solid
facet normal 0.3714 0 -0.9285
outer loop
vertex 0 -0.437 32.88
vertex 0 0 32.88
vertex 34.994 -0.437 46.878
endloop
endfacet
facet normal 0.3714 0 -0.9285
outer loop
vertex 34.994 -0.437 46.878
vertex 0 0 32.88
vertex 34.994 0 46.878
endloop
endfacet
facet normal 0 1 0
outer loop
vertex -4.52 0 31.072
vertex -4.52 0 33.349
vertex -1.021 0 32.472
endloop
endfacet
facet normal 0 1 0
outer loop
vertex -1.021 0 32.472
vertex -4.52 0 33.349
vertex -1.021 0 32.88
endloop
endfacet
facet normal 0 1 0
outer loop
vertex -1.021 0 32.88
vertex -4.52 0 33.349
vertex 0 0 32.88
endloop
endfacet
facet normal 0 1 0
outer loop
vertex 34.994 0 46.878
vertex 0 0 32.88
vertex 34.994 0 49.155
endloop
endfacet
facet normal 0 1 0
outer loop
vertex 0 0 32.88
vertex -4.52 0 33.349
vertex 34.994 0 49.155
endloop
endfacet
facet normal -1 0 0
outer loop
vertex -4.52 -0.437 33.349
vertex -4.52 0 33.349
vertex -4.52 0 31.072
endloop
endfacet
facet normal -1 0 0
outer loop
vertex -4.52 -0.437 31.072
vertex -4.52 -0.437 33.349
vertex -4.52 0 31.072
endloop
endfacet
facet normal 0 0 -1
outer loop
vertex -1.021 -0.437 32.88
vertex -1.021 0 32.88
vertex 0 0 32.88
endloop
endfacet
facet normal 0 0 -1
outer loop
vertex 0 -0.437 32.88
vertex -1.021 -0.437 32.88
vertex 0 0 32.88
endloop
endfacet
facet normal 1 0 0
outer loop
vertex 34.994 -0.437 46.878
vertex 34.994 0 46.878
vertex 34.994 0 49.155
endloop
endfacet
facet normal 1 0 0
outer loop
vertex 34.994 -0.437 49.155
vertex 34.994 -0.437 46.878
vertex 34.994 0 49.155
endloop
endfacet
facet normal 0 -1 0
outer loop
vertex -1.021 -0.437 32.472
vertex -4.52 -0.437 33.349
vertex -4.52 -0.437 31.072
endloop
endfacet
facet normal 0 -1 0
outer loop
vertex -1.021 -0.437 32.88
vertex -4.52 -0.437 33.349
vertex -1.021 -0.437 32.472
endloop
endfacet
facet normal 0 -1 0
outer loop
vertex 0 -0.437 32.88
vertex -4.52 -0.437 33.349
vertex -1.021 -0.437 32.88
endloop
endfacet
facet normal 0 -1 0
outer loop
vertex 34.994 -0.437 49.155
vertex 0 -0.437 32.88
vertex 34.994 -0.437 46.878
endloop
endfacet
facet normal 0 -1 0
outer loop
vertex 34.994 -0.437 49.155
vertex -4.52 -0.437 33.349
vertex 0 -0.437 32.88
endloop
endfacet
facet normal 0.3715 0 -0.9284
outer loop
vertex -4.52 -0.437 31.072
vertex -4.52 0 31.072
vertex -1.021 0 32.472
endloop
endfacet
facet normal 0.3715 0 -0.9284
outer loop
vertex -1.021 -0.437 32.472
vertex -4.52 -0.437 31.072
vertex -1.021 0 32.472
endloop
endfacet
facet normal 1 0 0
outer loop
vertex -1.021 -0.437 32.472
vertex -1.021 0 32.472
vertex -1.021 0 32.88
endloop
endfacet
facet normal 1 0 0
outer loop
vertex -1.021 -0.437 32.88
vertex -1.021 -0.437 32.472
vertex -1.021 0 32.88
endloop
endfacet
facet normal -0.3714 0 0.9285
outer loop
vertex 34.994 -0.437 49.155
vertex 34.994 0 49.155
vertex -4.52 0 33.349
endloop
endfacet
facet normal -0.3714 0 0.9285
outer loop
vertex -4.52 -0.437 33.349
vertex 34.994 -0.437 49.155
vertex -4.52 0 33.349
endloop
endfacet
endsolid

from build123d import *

# Parameters (mm, degrees)
F2_DEPTH = 38.1
F3_SCALE = 0.0114810563


with BuildPart() as f2:
    # F1 (on Front) → F2 (new body)
    with BuildSketch(Plane.XZ):
        Polygon((0, 2863.85), (3048, 4083.05), (3048, 4281.3856198468), (-393.7, 2904.7056198468), (-393.7, 2706.37), (-88.9, 2828.29), (-88.9, 2863.85), align=None)
    extrude(amount=F2_DEPTH)


with BuildPart() as f2_1:
    # F3: moved
    add(f2.part.scale(F3_SCALE))


solid = f2_1.part
